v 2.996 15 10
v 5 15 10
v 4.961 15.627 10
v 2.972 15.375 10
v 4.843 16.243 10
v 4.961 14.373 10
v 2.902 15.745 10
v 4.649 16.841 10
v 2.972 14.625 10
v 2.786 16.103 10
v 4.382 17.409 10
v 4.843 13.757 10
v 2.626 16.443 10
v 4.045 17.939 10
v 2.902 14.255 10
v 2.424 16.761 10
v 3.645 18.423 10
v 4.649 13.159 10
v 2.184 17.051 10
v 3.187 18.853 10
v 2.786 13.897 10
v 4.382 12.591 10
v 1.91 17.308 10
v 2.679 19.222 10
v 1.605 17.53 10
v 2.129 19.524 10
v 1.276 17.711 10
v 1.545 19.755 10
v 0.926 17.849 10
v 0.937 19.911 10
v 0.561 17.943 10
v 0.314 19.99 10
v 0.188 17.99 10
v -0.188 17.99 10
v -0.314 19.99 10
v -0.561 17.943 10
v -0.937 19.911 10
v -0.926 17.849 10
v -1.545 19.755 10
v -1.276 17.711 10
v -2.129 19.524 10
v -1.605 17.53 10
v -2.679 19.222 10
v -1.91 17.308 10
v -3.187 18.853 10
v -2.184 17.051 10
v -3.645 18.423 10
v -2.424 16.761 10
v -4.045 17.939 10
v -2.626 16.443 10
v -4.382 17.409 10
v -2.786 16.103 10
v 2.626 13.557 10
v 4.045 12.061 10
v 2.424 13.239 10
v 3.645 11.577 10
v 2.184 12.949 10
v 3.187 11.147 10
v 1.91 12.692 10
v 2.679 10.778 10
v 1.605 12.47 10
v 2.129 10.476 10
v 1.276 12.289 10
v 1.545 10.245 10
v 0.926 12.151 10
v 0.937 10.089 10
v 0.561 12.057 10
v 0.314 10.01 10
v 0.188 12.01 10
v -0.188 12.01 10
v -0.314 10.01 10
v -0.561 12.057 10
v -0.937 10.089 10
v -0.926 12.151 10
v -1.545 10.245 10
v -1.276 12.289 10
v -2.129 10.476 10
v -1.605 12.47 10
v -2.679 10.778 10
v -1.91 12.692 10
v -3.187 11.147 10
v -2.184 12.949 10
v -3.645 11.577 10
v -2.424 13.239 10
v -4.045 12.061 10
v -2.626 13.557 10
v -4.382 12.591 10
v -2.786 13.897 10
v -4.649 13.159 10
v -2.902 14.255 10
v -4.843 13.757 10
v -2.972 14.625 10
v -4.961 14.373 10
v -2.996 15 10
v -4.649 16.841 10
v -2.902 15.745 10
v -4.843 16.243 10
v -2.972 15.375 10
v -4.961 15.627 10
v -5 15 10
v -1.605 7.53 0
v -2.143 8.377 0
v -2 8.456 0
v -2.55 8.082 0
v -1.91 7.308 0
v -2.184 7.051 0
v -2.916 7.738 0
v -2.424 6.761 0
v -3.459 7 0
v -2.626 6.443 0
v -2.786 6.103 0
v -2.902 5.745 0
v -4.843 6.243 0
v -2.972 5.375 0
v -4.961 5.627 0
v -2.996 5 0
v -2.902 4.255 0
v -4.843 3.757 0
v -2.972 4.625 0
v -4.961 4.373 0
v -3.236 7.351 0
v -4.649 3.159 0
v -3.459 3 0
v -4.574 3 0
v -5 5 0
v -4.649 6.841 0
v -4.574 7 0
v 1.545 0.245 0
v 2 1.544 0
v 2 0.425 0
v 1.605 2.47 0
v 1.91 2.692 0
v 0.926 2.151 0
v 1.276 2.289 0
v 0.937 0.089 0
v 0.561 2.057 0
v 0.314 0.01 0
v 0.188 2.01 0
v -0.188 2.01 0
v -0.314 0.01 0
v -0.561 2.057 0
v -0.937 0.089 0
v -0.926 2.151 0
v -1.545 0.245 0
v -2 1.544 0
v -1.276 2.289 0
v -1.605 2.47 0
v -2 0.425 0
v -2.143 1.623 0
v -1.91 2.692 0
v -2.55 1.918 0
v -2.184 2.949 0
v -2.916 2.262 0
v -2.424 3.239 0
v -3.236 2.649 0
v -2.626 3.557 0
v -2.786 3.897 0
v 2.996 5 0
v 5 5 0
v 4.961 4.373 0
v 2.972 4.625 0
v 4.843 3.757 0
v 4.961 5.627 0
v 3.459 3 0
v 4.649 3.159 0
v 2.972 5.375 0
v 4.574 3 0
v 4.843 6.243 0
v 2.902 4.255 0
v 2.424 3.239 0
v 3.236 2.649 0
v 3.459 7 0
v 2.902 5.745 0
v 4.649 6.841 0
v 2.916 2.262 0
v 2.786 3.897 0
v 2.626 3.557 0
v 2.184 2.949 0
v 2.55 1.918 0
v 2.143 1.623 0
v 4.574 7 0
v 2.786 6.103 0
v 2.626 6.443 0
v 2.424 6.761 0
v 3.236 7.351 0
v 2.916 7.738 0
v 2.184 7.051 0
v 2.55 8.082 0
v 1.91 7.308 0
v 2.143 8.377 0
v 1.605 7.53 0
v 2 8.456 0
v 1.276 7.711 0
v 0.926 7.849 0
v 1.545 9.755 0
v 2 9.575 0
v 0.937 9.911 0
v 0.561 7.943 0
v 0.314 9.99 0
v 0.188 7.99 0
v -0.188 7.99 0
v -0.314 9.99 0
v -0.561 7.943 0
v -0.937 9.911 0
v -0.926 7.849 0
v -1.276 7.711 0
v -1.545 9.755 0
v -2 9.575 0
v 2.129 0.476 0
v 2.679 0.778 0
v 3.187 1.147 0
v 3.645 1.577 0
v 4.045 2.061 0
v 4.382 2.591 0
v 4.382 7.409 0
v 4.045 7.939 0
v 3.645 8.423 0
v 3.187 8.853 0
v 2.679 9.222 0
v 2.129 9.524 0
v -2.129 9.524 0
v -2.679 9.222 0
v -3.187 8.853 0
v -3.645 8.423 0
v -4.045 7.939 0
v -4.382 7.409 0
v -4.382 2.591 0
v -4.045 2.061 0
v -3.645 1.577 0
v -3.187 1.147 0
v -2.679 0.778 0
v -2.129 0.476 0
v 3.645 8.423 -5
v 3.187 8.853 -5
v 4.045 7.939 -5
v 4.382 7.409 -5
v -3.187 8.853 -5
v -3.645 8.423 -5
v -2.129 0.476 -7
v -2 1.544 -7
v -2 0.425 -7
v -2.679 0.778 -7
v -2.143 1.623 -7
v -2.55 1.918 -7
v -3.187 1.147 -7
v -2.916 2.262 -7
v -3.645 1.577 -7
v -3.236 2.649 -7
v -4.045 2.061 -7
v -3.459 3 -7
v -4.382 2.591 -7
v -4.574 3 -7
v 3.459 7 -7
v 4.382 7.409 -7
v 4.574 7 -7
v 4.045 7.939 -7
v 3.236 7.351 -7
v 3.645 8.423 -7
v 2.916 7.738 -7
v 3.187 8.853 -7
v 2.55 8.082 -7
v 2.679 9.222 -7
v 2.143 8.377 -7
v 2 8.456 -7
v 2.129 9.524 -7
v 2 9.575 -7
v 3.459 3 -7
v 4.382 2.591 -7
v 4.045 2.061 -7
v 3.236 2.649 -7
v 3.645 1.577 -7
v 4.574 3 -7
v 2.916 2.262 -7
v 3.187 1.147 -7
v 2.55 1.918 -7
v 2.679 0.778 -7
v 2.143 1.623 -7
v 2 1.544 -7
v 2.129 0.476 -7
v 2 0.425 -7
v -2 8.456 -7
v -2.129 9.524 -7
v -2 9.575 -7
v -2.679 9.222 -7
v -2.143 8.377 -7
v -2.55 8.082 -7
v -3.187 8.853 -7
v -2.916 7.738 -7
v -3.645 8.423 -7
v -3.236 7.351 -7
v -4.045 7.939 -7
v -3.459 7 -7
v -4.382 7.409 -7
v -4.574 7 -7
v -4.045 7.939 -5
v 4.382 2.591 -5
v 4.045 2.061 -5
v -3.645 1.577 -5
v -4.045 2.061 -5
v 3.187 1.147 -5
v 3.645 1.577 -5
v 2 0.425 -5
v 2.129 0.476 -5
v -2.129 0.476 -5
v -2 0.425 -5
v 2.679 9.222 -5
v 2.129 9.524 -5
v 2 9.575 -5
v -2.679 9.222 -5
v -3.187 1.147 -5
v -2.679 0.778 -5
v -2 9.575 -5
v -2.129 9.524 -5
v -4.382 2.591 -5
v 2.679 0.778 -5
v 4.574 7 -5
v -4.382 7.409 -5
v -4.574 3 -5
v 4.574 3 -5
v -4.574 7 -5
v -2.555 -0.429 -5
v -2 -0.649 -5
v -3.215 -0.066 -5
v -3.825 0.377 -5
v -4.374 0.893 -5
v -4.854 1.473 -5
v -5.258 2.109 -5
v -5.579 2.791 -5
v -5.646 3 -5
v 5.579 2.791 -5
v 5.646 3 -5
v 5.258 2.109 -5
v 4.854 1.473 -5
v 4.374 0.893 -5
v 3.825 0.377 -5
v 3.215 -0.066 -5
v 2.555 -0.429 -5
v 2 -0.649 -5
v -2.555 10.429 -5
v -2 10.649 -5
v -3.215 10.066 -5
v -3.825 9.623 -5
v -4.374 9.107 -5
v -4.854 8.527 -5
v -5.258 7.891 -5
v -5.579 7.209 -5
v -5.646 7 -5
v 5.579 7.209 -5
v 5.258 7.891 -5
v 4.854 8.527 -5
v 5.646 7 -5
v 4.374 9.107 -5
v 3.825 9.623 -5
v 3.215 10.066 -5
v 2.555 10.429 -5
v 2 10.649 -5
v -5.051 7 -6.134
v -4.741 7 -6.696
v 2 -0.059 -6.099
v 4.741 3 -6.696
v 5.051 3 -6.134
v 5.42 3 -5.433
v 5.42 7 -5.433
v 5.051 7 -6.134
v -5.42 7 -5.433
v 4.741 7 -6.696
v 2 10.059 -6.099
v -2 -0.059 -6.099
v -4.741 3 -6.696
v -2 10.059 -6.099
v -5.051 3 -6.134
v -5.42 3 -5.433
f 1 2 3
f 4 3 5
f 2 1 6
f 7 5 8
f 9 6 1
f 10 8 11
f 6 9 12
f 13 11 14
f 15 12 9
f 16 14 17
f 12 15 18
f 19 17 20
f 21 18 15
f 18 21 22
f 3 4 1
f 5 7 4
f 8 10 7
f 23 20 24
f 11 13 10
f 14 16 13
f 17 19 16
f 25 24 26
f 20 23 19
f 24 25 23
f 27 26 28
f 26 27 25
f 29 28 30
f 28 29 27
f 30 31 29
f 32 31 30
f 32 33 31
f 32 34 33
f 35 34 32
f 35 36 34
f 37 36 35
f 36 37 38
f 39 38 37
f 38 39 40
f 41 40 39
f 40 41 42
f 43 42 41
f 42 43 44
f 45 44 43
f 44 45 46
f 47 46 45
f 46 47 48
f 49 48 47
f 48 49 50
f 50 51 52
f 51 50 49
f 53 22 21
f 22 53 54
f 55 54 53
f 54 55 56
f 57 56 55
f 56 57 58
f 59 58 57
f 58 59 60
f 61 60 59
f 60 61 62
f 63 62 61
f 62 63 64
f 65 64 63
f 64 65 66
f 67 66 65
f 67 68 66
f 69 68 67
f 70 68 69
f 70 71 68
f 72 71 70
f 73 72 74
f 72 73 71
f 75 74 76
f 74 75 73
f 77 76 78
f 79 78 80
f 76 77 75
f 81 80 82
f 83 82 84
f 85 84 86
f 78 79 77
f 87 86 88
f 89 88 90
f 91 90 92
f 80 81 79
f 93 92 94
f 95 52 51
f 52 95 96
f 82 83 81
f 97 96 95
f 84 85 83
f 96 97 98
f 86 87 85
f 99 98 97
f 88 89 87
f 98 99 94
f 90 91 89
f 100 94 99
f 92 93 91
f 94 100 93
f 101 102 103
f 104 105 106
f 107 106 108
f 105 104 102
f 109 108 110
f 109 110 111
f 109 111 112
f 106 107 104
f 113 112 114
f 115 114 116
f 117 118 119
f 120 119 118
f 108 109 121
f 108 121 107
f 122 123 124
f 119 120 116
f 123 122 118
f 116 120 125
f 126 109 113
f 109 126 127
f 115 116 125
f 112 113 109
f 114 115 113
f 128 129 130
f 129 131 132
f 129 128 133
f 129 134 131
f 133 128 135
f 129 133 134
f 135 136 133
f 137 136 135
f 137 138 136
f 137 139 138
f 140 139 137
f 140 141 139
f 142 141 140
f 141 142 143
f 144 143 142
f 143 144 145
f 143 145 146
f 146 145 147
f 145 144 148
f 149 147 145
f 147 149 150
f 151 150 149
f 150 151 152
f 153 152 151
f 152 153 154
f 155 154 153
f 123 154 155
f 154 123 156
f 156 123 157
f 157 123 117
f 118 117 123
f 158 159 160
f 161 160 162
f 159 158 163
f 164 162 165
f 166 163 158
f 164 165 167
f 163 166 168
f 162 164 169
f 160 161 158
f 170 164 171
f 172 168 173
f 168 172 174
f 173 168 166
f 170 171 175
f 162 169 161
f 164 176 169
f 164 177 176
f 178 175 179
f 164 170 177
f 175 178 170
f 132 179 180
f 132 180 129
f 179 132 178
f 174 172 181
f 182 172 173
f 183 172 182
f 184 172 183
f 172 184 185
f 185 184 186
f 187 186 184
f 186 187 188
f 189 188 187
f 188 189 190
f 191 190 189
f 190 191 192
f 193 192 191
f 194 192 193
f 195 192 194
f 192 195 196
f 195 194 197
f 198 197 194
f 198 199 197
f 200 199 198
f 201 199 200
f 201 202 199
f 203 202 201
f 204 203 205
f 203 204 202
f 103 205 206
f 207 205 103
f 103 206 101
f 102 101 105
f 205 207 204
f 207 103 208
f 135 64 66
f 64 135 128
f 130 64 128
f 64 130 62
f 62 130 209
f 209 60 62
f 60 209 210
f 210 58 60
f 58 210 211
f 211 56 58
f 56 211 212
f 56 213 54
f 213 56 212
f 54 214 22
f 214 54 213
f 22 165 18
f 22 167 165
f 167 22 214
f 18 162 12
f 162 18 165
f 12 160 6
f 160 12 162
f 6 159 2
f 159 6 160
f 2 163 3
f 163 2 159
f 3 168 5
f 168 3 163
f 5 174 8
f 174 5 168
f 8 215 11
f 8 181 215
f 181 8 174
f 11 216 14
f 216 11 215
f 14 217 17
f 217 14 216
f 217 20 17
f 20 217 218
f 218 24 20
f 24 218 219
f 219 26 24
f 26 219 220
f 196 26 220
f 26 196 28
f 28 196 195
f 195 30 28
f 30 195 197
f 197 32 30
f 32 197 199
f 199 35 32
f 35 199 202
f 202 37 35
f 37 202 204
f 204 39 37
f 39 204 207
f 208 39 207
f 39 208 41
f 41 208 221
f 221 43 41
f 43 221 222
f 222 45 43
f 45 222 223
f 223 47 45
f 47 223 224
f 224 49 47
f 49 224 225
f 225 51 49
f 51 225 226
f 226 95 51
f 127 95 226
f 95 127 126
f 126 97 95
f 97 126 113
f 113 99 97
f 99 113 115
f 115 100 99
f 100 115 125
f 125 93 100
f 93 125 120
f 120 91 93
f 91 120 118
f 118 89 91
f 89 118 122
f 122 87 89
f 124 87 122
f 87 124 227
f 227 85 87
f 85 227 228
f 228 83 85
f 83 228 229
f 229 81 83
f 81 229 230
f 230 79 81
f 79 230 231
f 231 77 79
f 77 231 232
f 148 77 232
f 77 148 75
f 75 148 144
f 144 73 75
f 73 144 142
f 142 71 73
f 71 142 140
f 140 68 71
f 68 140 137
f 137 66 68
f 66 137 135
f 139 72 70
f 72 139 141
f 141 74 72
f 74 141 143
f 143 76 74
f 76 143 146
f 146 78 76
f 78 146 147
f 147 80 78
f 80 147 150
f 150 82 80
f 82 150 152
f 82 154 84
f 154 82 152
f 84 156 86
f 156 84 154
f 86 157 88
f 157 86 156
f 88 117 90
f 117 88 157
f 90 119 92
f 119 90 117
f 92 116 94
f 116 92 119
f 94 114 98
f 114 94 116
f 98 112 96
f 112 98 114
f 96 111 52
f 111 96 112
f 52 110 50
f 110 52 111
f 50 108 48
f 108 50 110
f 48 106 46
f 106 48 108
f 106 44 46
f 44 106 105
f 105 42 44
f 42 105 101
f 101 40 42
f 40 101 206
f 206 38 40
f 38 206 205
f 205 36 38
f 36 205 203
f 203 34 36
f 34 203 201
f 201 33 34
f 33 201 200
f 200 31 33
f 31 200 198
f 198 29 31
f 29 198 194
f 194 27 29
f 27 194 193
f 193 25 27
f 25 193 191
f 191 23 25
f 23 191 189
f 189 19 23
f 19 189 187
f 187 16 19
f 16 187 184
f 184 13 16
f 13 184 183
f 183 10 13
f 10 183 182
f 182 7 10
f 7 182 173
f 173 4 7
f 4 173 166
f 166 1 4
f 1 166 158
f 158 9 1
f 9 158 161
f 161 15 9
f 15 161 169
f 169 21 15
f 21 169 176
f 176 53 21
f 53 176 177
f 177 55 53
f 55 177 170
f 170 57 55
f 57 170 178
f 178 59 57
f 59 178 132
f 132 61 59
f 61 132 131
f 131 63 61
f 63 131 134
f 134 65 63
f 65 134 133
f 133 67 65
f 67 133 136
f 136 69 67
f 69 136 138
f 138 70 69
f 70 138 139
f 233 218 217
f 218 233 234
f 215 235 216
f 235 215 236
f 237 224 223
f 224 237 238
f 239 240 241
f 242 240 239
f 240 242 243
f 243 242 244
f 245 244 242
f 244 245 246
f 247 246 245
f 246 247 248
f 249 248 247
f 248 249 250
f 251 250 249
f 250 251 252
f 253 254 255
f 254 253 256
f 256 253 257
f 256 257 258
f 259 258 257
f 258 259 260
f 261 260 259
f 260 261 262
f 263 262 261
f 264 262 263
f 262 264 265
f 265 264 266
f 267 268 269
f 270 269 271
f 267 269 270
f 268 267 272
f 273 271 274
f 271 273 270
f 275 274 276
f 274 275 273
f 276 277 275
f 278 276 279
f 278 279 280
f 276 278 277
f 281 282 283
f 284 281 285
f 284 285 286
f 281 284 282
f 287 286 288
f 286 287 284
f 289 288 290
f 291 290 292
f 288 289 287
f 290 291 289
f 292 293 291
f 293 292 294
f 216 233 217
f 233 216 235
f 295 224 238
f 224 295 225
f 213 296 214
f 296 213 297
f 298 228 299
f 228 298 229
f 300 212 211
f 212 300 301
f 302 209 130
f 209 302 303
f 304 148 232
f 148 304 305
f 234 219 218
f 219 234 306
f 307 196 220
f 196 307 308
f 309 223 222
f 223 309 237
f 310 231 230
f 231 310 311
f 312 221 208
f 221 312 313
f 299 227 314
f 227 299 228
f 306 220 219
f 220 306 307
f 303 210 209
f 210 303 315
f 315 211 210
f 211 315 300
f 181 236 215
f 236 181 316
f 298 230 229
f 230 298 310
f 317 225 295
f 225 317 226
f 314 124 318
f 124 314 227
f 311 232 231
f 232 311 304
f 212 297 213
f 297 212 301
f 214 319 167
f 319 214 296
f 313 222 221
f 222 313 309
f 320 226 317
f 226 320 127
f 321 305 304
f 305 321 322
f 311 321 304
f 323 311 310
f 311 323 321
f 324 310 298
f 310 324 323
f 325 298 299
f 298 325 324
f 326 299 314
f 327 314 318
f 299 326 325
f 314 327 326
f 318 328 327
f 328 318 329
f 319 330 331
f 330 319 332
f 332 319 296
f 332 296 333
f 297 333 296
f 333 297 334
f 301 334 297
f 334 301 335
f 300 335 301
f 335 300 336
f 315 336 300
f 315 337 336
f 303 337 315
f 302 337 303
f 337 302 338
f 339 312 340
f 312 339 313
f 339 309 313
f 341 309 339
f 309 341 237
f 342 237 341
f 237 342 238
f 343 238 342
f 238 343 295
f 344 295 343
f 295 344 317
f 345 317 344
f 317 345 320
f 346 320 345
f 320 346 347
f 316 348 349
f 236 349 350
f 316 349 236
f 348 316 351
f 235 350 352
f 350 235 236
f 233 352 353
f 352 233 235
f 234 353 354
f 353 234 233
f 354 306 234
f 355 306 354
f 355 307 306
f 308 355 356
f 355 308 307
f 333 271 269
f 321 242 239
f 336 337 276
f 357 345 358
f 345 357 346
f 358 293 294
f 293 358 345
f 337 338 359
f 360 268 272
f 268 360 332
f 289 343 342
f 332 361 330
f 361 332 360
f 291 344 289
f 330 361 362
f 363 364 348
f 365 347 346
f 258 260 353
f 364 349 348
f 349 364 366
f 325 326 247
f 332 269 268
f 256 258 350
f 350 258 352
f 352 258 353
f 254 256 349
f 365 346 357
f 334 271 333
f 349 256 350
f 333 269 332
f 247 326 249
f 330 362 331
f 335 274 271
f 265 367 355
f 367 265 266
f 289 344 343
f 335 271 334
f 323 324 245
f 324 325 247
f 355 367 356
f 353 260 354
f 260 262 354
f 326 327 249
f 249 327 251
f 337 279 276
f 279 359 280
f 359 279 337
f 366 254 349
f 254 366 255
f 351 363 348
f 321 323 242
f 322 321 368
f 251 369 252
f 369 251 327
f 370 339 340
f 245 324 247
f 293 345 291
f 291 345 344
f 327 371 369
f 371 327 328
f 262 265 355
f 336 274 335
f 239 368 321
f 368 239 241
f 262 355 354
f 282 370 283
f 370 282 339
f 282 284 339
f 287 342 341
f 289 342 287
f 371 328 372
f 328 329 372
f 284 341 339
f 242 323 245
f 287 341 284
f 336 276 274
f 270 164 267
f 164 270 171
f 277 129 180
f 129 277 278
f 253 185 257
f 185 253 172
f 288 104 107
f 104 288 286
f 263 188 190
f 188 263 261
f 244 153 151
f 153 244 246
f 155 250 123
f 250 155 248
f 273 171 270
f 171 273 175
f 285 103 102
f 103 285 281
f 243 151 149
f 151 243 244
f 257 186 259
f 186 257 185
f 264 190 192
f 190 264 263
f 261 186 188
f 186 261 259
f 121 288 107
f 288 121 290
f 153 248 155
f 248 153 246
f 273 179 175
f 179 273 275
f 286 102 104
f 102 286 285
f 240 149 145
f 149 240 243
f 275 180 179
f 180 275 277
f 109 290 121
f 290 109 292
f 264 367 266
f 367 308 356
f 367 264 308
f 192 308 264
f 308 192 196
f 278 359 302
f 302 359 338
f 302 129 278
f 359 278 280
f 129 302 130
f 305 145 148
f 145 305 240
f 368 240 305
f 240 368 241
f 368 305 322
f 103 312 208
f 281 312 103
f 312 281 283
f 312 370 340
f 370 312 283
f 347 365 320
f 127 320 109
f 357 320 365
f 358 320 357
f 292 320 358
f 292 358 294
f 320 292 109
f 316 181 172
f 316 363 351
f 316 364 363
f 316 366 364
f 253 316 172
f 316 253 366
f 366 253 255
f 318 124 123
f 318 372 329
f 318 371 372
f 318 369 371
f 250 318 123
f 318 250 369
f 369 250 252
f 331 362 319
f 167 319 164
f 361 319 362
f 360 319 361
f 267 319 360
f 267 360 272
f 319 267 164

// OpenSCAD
$fn = 50;

thickness = 2;

opening = 10;
angle = 45;
support = 10;

catch = 2; 
insert = 5;

arm();

module arm() {
color("pink") {
    
    x = (opening) * sin(angle)  ;
    
    union() {
        intersection() {
            translate([-opening/2, 0, 0])
            cube([opening, opening + 2*x, opening ]);
            
            translate([0,x*sin(angle)/2,-x*sin(angle)/2])
            rotate([-angle,0,0]) {
                linear_extrude(height=support+support/sin(angle))
                scale([1, sin(angle)])
                {
                    difference() {
                        circle(d=opening);
                        
                        offset(delta=-thickness)
                            circle(d=opening);
                    }
                }
            }
        }
        
        translate([0, opening/2, -(insert+catch)])
        {
            difference() {
                union() {
                    cylinder(d=opening, h=(insert+catch));
                    cylinder(d1=opening, d2=(opening+catch),h=catch);
                }
                
                union() {
                    cylinder(d=opening-thickness, h=(insert+catch));
                    
                    translate([0, 0, (insert+catch)/2]) {
                        cube([opening-3*thickness, opening + catch, (insert+catch)], center = true);
                    }
                    
                    translate([0, 0, (insert+catch)/2]) {
                        cube([opening + catch, opening-3*thickness, (insert+catch)], center = true);
                    }
                }
            }
        }
    }
}
}
